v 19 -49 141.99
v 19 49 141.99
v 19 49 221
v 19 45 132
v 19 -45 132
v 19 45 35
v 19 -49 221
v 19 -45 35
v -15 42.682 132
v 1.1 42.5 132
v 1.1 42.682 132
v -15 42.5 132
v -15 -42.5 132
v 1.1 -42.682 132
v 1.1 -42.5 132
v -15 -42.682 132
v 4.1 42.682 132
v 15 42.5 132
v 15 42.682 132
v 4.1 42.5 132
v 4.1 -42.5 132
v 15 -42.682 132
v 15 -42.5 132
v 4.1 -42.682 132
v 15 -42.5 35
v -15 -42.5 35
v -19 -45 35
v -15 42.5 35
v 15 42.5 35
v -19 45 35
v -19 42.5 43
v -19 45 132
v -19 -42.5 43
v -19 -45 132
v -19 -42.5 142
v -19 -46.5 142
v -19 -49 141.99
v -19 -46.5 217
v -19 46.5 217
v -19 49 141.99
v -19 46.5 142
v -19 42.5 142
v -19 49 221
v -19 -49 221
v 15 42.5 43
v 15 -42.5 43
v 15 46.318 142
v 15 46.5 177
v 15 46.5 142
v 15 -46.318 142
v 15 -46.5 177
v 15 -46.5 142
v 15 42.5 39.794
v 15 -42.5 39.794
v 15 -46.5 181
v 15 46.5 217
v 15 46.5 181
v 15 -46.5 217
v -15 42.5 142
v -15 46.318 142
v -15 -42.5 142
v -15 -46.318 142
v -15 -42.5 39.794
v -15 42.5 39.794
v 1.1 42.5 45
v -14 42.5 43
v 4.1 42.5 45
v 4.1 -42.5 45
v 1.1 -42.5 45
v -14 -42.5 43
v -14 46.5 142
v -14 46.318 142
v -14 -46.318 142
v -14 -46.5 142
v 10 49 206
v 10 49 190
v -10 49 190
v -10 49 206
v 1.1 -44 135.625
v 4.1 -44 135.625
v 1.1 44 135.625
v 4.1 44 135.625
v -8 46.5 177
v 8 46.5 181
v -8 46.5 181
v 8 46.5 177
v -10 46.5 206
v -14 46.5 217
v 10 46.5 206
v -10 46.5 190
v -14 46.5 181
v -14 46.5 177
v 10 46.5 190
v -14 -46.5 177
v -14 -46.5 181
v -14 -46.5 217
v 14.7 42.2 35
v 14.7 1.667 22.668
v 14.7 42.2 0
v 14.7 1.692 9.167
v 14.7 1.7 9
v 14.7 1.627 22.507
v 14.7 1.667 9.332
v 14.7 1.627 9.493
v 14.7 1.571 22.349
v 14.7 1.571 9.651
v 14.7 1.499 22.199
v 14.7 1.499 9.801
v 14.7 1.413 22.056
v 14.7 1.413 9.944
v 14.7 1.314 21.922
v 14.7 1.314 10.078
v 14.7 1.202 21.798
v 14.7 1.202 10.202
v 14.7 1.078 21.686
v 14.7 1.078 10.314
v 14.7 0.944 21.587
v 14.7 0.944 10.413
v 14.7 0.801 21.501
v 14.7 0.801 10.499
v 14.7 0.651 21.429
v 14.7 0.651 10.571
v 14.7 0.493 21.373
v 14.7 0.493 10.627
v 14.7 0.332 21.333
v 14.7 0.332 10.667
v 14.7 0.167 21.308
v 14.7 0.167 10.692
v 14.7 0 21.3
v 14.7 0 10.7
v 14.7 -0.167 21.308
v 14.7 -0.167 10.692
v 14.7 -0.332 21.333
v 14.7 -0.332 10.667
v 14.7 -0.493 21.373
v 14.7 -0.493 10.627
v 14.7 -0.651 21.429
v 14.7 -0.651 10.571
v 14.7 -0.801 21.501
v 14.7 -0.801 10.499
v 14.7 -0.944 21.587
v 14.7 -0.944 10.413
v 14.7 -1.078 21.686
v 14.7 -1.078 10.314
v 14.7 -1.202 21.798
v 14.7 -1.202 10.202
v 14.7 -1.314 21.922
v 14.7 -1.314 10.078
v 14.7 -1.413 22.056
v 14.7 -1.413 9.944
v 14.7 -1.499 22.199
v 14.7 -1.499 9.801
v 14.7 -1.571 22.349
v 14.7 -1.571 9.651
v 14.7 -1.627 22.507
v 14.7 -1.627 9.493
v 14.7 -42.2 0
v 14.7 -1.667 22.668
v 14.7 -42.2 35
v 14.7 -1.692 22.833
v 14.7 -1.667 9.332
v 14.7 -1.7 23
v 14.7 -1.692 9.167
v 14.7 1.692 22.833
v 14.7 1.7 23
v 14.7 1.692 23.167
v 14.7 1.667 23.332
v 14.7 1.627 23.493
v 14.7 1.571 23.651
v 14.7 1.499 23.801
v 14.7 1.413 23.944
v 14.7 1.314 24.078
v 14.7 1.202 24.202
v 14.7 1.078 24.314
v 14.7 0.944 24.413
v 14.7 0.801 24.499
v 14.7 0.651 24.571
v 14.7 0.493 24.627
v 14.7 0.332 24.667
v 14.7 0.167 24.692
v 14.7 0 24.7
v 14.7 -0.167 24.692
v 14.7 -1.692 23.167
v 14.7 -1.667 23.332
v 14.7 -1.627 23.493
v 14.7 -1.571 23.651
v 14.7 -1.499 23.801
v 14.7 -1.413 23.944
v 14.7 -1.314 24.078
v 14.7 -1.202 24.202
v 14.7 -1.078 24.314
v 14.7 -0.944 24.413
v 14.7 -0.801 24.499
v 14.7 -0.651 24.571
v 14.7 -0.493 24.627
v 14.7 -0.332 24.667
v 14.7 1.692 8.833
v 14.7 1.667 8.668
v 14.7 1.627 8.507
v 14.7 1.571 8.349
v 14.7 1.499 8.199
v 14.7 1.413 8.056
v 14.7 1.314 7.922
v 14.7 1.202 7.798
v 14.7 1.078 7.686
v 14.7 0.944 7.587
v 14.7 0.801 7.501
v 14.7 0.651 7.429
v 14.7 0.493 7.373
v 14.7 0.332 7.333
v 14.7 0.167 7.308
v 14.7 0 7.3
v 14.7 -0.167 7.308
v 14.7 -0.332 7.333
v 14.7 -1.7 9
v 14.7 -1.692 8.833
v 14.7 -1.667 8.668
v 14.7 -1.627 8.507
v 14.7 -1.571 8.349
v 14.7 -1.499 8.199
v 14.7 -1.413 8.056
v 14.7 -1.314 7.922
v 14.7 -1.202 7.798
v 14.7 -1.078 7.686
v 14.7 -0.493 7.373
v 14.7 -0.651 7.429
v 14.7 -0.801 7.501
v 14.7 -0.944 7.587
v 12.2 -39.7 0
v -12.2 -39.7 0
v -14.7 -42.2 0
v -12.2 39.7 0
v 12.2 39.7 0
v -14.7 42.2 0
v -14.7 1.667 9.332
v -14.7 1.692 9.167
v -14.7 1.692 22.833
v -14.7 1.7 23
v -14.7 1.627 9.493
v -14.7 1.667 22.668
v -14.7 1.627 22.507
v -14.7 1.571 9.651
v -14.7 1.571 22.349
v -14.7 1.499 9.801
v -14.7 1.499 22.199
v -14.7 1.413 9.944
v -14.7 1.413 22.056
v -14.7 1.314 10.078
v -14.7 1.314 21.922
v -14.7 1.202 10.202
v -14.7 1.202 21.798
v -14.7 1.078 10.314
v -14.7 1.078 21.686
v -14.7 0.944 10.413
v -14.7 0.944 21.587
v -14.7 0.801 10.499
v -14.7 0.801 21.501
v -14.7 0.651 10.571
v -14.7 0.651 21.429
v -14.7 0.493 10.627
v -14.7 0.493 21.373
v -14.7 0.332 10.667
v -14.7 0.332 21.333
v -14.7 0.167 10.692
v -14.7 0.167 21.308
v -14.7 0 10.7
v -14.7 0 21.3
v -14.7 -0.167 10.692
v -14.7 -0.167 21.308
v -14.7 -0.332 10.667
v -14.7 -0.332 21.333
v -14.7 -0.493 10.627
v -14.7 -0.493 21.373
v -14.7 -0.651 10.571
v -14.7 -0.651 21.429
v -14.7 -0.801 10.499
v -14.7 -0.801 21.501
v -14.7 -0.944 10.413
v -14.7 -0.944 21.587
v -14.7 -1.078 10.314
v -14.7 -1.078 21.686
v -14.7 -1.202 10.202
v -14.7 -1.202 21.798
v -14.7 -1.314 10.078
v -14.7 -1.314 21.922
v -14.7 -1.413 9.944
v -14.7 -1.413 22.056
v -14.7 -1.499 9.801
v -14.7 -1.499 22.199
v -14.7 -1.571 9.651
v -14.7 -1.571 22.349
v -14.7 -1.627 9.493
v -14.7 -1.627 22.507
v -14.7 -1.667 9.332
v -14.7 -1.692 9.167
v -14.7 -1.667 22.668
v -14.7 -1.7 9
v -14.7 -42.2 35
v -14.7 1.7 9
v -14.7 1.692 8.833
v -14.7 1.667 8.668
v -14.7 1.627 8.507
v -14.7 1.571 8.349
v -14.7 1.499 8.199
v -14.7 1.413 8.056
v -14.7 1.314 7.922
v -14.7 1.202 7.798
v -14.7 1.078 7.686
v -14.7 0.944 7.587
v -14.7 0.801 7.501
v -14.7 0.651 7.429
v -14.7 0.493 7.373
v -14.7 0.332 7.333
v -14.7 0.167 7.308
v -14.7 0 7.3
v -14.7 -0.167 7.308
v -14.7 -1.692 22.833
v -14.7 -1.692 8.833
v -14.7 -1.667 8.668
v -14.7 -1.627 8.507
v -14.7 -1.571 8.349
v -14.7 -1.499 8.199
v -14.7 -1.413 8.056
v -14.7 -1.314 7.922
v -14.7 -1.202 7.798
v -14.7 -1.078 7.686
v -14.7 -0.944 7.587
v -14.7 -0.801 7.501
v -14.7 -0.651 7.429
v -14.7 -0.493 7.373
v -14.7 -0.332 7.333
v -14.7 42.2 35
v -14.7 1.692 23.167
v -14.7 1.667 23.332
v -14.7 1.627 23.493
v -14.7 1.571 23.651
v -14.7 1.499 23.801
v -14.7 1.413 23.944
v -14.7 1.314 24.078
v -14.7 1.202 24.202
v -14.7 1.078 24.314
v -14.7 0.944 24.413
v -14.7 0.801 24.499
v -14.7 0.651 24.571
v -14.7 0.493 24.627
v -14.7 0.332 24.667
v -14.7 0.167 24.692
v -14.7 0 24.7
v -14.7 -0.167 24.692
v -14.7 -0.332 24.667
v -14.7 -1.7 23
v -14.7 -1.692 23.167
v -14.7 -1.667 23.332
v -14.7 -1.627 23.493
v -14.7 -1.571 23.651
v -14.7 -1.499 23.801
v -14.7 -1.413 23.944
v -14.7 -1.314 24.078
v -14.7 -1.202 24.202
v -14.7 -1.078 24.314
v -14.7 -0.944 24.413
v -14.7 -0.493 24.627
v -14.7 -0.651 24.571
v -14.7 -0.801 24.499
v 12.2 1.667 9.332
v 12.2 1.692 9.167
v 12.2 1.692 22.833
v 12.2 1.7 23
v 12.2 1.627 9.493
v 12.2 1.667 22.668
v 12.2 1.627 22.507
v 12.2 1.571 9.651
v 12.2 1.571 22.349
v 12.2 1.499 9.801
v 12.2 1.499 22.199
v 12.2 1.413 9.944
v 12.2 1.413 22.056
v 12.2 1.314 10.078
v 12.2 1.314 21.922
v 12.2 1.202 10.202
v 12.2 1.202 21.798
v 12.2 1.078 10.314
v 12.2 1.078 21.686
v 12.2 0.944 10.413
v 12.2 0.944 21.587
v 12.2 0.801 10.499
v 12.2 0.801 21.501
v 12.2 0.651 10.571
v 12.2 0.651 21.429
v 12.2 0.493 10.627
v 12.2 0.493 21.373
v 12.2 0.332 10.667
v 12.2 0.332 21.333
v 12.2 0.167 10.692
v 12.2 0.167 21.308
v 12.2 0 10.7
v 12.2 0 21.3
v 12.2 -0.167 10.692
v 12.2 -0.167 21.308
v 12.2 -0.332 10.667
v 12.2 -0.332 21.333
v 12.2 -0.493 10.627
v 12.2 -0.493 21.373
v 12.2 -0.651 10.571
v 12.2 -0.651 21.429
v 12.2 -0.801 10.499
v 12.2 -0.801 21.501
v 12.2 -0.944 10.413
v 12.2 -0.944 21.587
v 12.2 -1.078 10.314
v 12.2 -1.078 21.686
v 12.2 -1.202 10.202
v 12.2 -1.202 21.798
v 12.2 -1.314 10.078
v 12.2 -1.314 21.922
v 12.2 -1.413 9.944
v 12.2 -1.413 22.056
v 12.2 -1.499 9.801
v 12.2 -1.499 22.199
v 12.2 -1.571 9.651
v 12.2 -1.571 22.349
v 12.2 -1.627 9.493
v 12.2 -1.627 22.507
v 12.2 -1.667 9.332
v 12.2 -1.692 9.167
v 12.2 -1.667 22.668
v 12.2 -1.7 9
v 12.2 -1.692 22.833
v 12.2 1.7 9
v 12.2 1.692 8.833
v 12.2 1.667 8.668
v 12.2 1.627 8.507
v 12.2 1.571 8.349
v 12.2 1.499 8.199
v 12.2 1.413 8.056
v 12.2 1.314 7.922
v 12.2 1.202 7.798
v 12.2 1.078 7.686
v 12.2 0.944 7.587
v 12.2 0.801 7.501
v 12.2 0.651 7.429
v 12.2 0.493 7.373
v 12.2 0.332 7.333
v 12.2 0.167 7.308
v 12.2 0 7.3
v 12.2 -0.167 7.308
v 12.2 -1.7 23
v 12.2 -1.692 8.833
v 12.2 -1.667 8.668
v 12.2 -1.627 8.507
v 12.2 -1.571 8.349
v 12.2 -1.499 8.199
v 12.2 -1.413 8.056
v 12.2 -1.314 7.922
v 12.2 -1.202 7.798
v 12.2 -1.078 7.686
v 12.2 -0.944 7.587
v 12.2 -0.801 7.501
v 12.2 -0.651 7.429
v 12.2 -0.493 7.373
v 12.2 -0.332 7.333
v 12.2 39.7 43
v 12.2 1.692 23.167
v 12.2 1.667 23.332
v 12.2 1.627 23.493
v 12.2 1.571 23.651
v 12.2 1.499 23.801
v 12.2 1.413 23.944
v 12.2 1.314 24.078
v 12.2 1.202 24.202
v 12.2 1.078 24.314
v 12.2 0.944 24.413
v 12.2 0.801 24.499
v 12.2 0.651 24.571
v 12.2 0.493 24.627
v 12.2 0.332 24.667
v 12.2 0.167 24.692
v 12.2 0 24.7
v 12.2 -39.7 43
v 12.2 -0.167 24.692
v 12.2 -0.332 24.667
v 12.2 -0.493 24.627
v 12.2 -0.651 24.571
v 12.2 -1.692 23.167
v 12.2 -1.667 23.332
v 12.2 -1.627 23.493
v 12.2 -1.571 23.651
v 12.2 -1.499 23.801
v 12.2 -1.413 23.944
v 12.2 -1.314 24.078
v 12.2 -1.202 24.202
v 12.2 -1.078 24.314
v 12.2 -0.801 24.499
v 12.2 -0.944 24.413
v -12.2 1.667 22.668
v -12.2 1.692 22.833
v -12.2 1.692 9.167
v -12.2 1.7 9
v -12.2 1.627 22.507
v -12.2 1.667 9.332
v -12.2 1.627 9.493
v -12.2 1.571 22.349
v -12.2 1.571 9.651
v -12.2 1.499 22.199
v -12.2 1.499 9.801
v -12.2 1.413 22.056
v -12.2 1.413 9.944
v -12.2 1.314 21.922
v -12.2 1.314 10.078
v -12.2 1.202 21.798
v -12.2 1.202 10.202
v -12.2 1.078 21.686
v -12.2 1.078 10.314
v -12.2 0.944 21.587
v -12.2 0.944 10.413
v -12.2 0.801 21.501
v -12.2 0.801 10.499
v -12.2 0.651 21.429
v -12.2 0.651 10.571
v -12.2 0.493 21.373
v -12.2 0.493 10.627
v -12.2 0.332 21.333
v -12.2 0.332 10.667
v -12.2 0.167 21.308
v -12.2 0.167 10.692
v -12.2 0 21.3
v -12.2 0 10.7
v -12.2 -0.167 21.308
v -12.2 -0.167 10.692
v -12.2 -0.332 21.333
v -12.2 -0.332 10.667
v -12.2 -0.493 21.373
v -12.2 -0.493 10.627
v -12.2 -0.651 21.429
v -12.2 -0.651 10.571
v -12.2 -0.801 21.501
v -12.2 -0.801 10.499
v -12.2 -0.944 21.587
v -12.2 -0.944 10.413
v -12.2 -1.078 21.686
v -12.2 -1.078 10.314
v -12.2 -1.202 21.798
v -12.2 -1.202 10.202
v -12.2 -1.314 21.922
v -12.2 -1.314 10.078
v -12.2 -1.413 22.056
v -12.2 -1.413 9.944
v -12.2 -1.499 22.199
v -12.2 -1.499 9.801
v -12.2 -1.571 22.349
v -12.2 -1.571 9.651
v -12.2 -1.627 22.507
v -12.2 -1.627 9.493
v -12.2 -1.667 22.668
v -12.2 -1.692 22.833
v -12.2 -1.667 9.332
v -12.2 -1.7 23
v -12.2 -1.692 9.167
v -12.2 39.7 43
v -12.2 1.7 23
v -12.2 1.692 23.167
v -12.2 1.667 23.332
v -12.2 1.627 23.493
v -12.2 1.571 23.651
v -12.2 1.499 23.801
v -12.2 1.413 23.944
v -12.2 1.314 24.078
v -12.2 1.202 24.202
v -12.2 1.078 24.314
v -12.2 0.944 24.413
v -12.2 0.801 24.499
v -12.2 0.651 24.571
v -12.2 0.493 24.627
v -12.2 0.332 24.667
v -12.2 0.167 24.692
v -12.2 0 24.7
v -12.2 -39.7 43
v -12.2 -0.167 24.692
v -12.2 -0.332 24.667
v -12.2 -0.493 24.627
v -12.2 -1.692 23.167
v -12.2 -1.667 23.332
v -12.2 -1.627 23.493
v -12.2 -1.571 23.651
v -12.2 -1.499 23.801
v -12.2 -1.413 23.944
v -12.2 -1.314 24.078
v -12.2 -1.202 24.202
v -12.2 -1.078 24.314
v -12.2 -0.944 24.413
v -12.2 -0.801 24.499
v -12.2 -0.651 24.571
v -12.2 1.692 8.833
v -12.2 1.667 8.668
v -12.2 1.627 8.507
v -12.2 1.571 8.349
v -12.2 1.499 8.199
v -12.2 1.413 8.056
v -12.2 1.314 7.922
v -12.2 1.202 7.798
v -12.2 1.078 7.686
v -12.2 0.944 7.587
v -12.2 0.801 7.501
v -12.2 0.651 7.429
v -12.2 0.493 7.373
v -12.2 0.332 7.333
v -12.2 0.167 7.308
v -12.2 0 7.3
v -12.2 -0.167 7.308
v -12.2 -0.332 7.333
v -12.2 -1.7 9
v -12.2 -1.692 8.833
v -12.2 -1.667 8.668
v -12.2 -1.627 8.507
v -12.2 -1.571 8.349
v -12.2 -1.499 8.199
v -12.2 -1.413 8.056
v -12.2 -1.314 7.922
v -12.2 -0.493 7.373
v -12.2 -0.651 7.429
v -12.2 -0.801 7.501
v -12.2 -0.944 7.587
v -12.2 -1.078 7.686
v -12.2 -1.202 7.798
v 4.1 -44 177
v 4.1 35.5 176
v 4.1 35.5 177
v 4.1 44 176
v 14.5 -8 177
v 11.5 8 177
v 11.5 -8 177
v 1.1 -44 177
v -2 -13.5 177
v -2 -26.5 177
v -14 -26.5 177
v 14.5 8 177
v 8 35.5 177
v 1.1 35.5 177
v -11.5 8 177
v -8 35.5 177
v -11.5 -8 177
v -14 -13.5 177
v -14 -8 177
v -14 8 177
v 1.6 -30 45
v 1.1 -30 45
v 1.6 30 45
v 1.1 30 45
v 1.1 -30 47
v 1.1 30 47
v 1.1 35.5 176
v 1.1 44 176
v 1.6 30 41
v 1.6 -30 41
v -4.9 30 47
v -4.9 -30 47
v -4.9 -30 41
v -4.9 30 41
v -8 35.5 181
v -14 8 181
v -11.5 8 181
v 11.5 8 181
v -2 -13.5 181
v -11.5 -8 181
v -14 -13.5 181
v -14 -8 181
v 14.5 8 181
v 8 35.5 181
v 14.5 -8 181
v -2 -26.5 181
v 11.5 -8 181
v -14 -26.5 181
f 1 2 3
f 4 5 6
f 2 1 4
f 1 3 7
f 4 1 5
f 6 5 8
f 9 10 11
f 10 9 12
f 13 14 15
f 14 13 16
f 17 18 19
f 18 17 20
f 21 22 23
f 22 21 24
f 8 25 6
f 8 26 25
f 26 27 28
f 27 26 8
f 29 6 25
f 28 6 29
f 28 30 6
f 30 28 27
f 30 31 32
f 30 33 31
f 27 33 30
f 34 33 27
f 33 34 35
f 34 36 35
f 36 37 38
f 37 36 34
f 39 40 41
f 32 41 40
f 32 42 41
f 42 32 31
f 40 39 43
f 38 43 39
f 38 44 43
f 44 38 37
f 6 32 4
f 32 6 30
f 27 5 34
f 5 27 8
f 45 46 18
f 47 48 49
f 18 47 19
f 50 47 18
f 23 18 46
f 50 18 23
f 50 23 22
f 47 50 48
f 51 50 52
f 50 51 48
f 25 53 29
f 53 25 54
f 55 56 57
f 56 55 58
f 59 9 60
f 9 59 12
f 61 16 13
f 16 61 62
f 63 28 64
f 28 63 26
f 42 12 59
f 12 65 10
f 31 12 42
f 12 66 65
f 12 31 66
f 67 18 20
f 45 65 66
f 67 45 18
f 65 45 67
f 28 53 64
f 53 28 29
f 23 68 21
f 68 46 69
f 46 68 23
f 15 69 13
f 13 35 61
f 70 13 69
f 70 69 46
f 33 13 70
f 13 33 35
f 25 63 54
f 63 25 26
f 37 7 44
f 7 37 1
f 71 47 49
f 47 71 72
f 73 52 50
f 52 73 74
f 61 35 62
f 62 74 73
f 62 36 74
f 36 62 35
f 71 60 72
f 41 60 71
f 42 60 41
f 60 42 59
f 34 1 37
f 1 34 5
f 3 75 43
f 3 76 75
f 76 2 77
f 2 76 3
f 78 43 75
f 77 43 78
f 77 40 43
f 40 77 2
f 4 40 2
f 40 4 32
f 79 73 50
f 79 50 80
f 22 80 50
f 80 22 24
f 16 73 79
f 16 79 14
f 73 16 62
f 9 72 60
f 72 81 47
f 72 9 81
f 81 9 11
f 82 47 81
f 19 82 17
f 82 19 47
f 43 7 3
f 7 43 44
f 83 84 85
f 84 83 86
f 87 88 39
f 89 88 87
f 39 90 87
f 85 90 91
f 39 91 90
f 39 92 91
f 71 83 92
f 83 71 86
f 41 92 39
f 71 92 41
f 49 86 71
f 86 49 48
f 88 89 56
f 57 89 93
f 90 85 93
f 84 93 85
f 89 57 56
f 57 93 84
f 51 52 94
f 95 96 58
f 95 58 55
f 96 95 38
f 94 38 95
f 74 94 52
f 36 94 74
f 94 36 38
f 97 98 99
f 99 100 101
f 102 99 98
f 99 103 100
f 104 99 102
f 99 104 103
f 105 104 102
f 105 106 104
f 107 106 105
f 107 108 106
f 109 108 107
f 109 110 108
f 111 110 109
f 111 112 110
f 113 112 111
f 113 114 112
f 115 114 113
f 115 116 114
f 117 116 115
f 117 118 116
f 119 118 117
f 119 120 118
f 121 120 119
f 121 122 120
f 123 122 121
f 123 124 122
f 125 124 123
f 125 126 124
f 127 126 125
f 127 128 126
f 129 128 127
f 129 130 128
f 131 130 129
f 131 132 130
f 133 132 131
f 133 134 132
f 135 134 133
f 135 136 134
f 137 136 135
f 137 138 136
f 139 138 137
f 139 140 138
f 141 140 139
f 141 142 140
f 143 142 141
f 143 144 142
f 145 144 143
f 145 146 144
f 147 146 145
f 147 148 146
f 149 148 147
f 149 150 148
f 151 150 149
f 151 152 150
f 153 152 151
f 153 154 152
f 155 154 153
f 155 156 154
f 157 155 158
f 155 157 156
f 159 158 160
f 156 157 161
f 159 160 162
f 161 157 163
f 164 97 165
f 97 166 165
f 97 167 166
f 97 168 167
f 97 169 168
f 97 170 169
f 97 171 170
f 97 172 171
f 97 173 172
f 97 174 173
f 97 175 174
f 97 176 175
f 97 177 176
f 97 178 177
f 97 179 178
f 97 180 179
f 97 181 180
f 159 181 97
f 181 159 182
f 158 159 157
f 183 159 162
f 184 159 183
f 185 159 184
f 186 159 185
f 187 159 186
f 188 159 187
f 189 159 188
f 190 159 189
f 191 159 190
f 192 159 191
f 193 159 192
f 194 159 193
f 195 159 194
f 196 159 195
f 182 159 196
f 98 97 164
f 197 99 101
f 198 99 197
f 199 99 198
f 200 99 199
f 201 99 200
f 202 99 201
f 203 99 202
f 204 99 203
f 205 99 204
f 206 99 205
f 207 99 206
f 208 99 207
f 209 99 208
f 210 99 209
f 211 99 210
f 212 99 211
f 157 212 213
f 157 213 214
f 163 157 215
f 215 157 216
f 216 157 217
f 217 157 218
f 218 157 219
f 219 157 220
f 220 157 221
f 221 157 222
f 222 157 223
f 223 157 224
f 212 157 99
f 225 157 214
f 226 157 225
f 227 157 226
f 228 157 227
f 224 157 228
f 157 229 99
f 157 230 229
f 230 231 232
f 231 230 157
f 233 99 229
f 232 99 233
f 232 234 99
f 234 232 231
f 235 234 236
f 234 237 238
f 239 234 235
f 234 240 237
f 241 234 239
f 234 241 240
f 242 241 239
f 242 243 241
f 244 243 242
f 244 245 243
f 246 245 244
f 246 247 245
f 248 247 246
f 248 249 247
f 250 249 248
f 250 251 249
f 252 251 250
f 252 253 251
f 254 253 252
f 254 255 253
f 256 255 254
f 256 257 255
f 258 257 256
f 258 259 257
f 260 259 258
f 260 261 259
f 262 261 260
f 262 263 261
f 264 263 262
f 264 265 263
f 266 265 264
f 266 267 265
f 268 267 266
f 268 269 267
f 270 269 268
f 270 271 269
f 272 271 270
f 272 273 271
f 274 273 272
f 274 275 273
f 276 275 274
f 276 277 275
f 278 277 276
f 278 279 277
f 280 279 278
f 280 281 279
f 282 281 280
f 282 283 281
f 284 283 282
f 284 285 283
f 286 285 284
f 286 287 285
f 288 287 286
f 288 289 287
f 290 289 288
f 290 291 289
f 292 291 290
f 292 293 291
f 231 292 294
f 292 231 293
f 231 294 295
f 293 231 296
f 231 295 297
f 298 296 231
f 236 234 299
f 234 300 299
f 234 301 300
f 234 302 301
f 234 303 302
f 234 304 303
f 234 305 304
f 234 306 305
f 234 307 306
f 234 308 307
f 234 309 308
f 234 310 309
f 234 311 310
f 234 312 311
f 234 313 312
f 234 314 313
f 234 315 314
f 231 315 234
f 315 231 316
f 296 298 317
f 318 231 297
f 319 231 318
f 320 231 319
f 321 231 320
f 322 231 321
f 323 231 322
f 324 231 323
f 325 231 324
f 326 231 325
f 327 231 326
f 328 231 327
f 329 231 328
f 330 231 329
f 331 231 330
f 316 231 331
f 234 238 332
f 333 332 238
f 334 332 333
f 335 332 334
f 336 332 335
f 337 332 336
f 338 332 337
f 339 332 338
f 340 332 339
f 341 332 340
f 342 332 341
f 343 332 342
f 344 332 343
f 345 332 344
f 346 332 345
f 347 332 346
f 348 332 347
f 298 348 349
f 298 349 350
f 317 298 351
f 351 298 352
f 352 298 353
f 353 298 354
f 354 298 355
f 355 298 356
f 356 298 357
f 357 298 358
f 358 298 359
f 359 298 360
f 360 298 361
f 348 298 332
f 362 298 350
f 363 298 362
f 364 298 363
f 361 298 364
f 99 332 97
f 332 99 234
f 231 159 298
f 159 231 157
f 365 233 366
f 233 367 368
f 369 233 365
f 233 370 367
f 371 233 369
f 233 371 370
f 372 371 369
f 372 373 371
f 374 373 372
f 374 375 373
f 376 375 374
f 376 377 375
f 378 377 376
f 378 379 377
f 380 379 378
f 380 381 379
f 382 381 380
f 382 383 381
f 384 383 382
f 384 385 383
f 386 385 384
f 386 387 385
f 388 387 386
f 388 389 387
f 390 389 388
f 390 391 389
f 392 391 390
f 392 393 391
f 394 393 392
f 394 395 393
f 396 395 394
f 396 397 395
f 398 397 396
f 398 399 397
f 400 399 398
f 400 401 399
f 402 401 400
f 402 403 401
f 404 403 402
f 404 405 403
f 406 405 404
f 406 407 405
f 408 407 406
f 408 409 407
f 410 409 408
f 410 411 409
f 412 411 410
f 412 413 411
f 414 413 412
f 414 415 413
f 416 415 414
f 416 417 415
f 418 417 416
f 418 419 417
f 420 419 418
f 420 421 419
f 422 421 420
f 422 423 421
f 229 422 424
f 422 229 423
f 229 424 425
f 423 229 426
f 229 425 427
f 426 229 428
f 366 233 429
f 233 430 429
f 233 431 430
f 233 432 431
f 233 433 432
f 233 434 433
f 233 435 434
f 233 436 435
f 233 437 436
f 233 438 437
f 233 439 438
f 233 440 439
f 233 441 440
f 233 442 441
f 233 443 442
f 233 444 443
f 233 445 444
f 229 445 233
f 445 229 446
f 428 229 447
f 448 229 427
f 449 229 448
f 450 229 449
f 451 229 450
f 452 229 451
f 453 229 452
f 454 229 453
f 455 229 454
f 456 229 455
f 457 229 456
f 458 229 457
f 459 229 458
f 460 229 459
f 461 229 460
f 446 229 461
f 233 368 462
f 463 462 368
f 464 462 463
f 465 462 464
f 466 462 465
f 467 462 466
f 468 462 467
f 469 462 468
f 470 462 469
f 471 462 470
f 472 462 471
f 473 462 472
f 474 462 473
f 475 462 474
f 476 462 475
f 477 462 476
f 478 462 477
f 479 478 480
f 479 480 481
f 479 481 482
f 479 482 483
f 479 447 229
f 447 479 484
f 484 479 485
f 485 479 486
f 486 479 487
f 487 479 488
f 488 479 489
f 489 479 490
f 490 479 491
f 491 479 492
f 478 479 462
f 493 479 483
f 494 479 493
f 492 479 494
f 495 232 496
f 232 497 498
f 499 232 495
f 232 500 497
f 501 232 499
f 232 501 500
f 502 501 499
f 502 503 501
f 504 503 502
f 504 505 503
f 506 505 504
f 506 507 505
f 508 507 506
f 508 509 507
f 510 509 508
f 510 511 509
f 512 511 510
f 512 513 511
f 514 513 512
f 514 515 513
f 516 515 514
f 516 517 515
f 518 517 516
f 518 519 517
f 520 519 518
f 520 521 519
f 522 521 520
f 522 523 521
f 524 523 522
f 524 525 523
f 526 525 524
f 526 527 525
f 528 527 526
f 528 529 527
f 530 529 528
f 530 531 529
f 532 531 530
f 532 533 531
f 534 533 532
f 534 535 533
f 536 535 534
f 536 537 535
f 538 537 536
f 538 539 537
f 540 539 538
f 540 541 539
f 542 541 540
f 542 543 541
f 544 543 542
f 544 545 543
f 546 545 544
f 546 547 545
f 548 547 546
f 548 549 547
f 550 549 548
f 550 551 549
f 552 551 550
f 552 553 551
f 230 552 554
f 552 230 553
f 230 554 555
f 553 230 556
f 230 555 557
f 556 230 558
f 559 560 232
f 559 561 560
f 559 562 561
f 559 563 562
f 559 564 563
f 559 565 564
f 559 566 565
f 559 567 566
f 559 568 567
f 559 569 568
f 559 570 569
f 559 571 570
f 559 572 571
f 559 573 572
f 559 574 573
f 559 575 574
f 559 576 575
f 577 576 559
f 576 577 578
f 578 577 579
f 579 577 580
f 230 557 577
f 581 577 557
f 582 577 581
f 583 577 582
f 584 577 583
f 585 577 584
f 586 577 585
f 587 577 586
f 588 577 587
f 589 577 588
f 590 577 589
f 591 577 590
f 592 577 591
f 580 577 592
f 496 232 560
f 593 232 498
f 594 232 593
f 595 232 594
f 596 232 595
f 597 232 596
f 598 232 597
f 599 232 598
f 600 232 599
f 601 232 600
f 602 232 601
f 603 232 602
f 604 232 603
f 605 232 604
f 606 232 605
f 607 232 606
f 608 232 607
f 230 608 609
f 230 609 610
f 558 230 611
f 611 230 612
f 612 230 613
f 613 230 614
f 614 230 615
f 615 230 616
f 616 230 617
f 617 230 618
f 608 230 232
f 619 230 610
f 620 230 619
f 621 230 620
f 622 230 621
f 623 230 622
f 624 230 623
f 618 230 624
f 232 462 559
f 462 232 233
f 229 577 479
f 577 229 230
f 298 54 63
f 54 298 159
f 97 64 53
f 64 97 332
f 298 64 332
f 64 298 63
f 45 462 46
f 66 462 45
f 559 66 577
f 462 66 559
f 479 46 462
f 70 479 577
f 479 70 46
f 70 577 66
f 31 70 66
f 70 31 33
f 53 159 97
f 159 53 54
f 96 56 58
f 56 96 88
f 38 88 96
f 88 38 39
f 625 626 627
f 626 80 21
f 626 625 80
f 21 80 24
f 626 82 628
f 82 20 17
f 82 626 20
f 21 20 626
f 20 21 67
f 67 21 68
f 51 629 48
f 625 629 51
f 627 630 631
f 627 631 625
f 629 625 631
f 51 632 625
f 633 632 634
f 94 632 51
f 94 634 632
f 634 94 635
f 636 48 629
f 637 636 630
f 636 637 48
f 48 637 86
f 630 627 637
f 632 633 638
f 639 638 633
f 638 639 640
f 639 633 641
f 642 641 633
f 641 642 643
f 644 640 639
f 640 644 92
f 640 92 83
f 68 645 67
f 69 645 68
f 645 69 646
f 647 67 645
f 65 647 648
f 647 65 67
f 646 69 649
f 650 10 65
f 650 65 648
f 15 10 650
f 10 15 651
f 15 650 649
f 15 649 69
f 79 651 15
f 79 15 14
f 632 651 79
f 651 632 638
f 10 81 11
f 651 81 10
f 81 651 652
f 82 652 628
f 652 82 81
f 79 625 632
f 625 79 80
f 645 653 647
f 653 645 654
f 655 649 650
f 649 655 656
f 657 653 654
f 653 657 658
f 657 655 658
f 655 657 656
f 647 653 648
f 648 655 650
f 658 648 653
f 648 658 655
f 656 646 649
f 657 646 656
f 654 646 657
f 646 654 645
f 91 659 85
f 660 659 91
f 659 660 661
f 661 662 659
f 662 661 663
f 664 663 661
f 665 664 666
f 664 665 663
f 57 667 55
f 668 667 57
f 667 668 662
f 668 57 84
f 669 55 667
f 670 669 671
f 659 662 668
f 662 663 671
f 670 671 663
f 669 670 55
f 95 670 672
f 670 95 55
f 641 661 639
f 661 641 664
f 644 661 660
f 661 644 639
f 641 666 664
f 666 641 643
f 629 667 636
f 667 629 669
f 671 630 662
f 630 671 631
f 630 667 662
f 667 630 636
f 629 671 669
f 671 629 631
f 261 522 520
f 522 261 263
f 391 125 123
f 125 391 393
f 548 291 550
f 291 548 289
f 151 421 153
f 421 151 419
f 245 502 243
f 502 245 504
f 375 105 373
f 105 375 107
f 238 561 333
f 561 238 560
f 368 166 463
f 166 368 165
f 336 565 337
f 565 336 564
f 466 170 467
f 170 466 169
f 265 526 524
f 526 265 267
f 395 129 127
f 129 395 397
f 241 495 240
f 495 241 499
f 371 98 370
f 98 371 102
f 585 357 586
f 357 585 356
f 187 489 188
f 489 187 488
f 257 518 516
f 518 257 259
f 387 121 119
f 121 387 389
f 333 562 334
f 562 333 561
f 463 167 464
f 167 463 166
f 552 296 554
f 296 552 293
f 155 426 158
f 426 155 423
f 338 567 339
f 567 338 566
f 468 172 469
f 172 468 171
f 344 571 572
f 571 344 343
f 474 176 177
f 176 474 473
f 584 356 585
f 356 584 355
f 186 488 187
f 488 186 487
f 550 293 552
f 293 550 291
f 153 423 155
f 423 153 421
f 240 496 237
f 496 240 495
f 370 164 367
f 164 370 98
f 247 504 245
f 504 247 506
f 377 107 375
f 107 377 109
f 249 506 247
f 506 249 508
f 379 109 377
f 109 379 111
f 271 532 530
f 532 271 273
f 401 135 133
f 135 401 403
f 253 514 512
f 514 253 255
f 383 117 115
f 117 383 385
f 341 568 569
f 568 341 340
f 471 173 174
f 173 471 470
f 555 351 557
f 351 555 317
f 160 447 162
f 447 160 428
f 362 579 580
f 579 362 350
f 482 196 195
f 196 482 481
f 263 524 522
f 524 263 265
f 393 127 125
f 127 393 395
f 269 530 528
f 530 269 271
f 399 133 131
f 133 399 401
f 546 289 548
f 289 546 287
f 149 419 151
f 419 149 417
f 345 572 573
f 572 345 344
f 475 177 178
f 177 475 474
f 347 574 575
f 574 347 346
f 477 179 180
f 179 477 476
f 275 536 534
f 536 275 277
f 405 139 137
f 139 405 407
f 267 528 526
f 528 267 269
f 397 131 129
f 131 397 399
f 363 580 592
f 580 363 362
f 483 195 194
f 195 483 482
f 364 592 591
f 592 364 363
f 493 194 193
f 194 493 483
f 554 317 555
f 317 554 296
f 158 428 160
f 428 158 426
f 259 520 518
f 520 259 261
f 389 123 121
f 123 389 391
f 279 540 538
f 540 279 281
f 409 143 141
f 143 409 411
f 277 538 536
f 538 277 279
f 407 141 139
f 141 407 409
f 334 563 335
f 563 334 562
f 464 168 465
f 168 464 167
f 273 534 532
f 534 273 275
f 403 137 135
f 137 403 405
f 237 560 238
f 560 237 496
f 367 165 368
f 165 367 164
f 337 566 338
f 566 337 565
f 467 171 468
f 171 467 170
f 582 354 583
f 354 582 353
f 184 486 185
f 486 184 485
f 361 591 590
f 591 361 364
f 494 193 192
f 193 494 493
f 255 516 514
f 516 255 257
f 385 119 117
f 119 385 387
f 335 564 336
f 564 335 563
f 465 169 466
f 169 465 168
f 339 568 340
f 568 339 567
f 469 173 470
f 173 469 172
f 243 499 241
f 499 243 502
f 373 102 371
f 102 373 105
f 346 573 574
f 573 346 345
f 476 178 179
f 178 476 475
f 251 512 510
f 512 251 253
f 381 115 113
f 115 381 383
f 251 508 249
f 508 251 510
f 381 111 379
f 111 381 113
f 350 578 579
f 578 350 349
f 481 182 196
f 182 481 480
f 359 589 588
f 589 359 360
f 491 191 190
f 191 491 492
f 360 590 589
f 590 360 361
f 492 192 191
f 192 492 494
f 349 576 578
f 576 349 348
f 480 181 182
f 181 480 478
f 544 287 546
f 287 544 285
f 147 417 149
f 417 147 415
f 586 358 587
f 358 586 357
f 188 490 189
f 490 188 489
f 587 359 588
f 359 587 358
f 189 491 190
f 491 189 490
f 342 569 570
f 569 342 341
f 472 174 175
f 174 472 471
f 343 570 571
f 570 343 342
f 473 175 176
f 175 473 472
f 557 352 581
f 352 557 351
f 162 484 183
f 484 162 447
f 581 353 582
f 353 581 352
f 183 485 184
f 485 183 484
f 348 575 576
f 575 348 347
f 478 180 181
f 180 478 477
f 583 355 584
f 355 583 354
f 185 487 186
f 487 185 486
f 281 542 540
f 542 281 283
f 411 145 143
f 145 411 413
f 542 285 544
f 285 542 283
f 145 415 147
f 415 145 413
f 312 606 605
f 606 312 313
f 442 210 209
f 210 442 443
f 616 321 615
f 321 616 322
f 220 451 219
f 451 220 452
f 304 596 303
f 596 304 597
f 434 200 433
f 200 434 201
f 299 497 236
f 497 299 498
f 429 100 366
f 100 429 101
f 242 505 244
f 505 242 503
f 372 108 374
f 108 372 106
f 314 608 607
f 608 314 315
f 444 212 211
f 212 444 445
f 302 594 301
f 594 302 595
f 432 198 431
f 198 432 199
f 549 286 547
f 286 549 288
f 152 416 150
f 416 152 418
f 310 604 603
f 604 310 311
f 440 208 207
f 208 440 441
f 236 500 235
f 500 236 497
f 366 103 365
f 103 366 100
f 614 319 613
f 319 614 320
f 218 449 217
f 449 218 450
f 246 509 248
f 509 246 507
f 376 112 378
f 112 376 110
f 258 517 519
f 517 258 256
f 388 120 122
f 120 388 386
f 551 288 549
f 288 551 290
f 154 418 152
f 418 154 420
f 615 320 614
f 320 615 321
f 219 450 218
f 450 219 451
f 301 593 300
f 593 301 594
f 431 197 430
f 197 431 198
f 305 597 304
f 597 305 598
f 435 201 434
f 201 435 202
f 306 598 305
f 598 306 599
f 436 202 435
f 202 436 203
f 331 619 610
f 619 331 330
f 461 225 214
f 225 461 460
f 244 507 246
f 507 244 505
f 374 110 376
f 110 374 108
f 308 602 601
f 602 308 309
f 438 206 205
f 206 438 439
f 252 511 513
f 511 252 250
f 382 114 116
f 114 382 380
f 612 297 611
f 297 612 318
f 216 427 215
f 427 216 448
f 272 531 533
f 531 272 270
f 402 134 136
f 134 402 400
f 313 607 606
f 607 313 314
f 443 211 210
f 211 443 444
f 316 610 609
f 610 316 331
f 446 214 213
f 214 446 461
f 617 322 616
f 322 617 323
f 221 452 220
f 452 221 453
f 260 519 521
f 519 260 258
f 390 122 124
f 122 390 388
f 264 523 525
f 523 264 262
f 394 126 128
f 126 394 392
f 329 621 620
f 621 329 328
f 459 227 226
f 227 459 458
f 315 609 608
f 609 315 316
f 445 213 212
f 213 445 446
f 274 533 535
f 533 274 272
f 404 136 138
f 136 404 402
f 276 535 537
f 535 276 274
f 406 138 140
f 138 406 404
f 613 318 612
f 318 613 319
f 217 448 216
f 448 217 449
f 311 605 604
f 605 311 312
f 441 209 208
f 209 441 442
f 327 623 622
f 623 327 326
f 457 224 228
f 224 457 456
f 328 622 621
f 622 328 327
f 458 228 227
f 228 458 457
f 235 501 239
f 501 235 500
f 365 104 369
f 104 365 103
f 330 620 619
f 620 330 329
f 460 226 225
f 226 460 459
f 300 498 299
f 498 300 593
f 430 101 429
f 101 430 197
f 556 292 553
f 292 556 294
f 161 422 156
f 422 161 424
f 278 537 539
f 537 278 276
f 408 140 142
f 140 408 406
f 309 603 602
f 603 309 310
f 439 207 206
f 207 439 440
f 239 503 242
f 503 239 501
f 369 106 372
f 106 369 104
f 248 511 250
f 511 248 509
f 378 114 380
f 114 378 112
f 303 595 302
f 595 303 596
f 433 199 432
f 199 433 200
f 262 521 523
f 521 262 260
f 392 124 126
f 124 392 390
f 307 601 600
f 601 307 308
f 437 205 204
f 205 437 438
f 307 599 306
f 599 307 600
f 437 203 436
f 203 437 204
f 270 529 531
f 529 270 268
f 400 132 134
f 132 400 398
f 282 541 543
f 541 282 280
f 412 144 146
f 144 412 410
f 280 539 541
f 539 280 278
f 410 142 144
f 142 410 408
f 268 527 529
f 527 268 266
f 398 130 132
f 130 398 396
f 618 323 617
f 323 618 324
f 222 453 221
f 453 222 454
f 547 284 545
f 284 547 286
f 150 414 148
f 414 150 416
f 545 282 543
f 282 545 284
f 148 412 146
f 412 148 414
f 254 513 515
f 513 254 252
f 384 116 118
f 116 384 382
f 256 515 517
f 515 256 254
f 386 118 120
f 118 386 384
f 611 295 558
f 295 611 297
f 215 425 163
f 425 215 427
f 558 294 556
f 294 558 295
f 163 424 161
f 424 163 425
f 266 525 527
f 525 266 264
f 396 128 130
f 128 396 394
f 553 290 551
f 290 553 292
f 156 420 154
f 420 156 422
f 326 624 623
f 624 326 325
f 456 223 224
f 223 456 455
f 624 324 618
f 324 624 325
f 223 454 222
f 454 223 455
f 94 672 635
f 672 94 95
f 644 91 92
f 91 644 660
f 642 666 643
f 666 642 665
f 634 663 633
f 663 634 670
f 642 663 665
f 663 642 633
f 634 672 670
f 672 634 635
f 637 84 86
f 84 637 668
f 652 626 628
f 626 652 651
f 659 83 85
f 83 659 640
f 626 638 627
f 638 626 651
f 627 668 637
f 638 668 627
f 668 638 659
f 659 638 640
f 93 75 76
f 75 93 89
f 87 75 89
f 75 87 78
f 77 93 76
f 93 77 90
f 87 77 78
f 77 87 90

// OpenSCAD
// Standalone robot upper body B piece (upper_bodyB v5.3) - A/B-final
// equipment bay, DOOR RETIRED. Changes vs v5.2 (2026-07-25):
//   - FULLY OPEN X- FACE: the return lips (3 mm) are removed, so the
//     service opening spans the FULL interior width - 85 in the 90 mm
//     body zone (vs the 75 board), 93 in the flared head. Reason: the
//     OpenCR connects not only along the board normal but also along
//     the board plane (power lead, USB, pin headers on the board edges)
//     - those cables must bend out through the front, so the face is
//     opened to the maximum. Edge stiffness is carried by the advanced
//     bulkhead (welded across both Y walls), the closed X+ wall, the
//     flare weld below and the head/cap above.
// Carried over from v5.2 (2026-07-24):
//   - +22 mm TALLER (robot_l2 372): 25 mm of open cable room over the
//     board top edge; the board itself does not move (ELL_IMU same).
//   - OpenCR = TAPE PAD + BOTTOM LEDGE (snap rivets retired).
//   - CLOSED TELESCOPING SLEEVE splice into part A, two cross bolts.
//   - POWER TOGGLE front-open slot in the shelf front edge ((*) measure
//     the real switch: tsl_w / tsl_back_x / tsl_y).
// Print UPRIGHT as placed, sleeve down (~221 tall - fits X1C 256);
// the battery shelf bridges ~30 mm across X - allow bridging or a
// little support through the open face.
// Edit shared dimensions in frame_master.scad so the assembly stays linked.

part_mode = "upper_body_b";
part_cutaway = false;     // true removes a corner quarter: bulkhead, tape
                          // pad, seating ledge and battery shelf visible.
                          // Set back to false before exporting the STL!
print_export = true;      // use high quality $fn for STL export

include <frame_master.scad>
